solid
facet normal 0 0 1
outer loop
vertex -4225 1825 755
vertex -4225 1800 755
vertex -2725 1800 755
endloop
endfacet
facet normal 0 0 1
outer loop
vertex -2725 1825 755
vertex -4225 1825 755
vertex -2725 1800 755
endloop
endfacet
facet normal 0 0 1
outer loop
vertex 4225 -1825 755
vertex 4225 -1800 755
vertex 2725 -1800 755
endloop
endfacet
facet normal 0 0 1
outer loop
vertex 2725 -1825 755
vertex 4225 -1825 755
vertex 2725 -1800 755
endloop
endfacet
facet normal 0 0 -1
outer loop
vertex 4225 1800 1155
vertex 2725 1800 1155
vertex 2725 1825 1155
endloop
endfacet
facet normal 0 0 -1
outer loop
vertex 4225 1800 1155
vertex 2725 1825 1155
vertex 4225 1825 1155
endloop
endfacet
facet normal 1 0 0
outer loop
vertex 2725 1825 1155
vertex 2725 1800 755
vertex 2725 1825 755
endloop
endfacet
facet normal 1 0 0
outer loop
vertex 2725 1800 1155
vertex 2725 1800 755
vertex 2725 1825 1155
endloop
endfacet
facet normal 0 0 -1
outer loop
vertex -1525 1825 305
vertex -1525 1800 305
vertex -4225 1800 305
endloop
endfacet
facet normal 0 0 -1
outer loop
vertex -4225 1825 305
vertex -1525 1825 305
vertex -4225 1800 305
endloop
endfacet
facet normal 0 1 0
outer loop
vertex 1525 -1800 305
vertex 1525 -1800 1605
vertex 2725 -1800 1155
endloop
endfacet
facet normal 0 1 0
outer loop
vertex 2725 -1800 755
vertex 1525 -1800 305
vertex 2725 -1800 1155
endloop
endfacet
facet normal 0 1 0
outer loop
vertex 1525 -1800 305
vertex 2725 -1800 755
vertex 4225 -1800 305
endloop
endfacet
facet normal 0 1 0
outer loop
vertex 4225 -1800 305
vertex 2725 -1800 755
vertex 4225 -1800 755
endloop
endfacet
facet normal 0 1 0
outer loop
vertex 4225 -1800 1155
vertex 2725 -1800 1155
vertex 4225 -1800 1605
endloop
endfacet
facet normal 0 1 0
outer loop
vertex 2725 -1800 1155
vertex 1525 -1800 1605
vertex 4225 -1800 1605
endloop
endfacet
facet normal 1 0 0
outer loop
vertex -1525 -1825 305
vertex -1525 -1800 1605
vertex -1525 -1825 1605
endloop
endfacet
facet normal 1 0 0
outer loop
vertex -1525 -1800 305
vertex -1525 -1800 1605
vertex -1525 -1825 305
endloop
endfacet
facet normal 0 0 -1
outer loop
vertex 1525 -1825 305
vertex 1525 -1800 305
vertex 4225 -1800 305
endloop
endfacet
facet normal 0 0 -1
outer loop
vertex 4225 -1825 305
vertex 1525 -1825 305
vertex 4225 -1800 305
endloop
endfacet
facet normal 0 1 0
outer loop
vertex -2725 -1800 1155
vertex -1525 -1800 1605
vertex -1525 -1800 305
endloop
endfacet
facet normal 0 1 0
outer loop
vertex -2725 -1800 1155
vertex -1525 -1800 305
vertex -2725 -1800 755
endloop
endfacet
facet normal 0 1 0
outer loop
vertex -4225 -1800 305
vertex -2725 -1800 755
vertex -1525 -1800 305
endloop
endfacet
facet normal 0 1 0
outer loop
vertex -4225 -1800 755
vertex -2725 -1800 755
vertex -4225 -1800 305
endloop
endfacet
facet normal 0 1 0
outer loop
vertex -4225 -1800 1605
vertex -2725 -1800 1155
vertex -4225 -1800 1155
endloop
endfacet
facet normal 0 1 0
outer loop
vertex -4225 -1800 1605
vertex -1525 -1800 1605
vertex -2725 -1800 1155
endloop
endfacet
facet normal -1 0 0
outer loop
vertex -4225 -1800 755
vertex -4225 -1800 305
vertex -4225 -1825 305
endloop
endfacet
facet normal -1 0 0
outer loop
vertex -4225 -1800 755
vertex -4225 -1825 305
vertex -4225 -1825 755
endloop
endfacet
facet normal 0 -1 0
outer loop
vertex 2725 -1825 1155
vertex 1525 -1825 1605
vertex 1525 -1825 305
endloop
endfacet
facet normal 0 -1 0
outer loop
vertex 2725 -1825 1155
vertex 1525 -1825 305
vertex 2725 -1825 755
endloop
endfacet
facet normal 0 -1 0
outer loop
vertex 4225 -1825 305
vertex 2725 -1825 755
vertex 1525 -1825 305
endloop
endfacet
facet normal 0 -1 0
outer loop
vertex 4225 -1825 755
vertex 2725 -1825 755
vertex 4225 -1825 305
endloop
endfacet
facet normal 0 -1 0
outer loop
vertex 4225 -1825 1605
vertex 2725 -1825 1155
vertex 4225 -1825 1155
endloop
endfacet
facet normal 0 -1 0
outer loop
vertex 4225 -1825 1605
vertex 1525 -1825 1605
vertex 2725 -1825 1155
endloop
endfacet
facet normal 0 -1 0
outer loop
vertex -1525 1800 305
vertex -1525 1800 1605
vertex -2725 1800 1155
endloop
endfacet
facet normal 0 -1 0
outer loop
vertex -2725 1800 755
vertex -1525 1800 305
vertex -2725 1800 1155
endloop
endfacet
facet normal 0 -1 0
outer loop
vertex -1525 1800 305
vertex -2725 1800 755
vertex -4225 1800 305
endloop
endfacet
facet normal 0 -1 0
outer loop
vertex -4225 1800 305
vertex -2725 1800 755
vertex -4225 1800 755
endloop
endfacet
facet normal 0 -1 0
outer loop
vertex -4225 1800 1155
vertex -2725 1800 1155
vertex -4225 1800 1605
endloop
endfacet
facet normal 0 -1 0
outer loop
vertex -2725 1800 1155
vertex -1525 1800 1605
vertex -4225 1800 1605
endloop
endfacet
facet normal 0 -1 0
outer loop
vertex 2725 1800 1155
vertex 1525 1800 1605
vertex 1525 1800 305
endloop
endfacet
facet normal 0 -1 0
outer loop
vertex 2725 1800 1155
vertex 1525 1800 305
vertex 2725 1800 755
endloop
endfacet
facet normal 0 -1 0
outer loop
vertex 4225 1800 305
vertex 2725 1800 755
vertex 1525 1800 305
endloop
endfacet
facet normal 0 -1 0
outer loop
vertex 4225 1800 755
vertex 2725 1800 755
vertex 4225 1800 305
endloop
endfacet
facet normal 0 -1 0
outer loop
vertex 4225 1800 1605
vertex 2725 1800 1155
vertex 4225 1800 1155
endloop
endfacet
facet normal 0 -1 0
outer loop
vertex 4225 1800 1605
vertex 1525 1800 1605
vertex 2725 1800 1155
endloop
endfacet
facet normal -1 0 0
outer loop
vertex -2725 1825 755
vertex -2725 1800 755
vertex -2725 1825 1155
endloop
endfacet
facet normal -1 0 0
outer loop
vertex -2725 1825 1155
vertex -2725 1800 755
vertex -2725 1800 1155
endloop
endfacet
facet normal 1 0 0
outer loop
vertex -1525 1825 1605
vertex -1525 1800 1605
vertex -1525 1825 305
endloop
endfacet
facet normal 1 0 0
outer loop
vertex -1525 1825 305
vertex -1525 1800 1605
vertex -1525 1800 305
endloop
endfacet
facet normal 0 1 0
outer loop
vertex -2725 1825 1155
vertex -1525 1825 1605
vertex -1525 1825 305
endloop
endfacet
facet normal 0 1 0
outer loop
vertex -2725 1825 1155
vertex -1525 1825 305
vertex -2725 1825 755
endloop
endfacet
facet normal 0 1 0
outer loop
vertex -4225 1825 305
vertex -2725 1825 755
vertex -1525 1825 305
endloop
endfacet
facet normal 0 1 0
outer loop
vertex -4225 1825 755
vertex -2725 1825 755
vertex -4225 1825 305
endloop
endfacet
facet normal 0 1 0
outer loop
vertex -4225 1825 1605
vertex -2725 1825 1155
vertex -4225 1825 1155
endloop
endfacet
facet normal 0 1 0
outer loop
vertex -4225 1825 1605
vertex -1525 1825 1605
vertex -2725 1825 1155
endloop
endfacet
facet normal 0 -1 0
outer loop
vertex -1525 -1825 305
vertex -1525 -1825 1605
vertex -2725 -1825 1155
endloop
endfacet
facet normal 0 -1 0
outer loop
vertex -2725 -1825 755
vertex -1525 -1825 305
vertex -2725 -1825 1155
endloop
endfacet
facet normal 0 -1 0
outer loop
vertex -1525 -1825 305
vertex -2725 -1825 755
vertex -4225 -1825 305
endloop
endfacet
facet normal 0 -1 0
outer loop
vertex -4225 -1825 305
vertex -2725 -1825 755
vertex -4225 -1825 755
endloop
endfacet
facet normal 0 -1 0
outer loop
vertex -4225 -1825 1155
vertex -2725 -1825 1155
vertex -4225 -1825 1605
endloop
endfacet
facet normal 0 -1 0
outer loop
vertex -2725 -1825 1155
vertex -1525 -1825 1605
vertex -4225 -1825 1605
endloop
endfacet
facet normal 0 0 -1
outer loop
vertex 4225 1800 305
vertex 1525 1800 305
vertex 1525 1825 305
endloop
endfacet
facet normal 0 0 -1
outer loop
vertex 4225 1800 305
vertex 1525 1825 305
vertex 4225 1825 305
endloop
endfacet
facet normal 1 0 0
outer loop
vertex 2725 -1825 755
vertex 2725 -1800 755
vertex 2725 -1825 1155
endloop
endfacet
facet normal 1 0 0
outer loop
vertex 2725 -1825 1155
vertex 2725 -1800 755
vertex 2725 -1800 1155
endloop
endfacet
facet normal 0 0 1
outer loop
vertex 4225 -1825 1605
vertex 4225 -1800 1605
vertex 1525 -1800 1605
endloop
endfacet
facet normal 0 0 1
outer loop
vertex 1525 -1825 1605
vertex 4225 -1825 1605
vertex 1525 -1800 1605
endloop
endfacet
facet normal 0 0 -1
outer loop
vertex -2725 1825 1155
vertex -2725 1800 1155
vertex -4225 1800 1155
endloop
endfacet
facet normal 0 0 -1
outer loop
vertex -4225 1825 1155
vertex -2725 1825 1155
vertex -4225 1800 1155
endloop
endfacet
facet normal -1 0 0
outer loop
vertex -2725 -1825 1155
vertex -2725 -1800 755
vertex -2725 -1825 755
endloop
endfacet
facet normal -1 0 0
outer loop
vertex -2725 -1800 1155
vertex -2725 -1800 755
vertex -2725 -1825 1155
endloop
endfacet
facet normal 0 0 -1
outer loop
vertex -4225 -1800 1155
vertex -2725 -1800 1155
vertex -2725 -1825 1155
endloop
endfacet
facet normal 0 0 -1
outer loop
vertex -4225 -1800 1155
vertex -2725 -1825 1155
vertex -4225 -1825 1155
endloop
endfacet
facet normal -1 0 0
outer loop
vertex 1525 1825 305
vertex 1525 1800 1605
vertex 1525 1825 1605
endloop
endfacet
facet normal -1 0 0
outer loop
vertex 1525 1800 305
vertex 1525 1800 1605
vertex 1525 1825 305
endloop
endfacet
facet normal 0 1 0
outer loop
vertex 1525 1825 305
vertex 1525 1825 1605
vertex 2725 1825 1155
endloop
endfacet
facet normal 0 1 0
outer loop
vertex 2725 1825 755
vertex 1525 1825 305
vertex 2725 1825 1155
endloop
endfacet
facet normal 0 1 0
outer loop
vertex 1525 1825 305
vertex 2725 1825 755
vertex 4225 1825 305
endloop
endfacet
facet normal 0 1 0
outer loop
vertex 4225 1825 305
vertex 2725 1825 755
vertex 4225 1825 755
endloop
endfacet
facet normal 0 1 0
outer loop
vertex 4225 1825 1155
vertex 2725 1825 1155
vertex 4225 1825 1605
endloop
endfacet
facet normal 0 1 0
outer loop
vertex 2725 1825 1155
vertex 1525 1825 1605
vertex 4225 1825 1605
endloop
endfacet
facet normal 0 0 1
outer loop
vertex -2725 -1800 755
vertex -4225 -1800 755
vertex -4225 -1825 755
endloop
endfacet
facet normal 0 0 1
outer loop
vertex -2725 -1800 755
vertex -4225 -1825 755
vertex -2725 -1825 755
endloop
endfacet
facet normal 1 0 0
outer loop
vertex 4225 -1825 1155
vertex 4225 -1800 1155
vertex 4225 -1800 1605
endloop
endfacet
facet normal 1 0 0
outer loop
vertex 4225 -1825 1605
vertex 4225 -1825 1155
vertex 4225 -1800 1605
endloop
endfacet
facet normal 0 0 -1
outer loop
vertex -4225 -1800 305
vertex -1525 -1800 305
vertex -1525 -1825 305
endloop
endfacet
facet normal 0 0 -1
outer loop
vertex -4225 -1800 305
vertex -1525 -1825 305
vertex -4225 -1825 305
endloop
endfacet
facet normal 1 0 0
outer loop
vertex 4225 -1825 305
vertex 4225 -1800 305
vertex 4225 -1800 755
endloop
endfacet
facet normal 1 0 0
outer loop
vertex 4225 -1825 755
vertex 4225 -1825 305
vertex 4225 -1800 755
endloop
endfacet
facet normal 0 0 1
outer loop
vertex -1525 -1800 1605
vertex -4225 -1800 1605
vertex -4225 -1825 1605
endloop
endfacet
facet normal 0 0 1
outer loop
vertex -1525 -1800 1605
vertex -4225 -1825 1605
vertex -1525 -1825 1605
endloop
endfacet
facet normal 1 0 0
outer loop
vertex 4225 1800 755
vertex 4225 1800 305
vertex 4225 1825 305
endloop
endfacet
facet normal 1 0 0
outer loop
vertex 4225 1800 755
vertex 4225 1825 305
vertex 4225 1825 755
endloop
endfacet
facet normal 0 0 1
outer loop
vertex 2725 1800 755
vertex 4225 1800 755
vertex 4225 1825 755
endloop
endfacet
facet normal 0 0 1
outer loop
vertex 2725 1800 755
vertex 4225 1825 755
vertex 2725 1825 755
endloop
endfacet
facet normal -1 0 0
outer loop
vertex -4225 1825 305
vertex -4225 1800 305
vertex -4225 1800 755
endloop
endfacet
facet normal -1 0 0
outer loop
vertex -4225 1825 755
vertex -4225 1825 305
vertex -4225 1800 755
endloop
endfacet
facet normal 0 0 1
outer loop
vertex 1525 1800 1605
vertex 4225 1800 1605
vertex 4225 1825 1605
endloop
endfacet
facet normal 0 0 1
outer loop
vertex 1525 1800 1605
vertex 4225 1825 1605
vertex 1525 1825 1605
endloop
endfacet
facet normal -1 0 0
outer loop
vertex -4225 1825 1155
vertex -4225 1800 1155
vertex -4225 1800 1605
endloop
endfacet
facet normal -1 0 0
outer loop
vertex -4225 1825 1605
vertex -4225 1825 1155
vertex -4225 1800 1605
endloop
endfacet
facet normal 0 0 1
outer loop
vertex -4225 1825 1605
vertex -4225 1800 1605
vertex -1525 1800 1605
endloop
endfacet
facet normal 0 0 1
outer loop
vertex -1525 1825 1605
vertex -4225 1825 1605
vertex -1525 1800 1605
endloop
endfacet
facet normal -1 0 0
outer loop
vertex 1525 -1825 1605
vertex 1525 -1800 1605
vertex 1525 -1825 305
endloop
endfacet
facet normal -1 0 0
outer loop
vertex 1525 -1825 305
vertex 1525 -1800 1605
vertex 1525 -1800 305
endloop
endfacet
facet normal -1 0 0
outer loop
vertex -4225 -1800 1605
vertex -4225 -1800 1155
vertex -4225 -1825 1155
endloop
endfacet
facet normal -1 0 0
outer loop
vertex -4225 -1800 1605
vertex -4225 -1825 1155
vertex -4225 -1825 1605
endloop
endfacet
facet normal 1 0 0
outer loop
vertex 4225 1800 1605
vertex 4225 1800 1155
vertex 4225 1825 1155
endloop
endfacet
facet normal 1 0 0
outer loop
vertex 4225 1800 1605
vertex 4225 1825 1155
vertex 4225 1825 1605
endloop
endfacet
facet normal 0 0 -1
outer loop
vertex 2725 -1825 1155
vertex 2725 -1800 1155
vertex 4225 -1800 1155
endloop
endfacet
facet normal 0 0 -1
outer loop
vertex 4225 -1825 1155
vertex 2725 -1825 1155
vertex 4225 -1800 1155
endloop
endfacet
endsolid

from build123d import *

# Parameters (mm, degrees)
F2_DEPTH = 25


with BuildPart() as f2:
    # F1 (on offset) → F2 (new body)
    with BuildSketch(Plane.XZ.offset(1800)):
        Polygon((4225, 1605), (1525, 1605), (1525, 305), (4225, 305), (4225, 755), (2725, 755), (2725, 1155), (4225, 1155), align=None)
    extrude(amount=F2_DEPTH)


with BuildPart() as f3_1:
    # F3: instance of F2
    add(f2.part.mirror(Plane.YZ))


with BuildPart() as f4_1:
    # F4: instance of F2
    add(f2.part.mirror(Plane.XZ))


with BuildPart() as f4_2:
    # F4: instance of F3_1
    add(f3_1.part.mirror(Plane.XZ))


solid = Compound([f2.part, f3_1.part, f4_1.part, f4_2.part])
